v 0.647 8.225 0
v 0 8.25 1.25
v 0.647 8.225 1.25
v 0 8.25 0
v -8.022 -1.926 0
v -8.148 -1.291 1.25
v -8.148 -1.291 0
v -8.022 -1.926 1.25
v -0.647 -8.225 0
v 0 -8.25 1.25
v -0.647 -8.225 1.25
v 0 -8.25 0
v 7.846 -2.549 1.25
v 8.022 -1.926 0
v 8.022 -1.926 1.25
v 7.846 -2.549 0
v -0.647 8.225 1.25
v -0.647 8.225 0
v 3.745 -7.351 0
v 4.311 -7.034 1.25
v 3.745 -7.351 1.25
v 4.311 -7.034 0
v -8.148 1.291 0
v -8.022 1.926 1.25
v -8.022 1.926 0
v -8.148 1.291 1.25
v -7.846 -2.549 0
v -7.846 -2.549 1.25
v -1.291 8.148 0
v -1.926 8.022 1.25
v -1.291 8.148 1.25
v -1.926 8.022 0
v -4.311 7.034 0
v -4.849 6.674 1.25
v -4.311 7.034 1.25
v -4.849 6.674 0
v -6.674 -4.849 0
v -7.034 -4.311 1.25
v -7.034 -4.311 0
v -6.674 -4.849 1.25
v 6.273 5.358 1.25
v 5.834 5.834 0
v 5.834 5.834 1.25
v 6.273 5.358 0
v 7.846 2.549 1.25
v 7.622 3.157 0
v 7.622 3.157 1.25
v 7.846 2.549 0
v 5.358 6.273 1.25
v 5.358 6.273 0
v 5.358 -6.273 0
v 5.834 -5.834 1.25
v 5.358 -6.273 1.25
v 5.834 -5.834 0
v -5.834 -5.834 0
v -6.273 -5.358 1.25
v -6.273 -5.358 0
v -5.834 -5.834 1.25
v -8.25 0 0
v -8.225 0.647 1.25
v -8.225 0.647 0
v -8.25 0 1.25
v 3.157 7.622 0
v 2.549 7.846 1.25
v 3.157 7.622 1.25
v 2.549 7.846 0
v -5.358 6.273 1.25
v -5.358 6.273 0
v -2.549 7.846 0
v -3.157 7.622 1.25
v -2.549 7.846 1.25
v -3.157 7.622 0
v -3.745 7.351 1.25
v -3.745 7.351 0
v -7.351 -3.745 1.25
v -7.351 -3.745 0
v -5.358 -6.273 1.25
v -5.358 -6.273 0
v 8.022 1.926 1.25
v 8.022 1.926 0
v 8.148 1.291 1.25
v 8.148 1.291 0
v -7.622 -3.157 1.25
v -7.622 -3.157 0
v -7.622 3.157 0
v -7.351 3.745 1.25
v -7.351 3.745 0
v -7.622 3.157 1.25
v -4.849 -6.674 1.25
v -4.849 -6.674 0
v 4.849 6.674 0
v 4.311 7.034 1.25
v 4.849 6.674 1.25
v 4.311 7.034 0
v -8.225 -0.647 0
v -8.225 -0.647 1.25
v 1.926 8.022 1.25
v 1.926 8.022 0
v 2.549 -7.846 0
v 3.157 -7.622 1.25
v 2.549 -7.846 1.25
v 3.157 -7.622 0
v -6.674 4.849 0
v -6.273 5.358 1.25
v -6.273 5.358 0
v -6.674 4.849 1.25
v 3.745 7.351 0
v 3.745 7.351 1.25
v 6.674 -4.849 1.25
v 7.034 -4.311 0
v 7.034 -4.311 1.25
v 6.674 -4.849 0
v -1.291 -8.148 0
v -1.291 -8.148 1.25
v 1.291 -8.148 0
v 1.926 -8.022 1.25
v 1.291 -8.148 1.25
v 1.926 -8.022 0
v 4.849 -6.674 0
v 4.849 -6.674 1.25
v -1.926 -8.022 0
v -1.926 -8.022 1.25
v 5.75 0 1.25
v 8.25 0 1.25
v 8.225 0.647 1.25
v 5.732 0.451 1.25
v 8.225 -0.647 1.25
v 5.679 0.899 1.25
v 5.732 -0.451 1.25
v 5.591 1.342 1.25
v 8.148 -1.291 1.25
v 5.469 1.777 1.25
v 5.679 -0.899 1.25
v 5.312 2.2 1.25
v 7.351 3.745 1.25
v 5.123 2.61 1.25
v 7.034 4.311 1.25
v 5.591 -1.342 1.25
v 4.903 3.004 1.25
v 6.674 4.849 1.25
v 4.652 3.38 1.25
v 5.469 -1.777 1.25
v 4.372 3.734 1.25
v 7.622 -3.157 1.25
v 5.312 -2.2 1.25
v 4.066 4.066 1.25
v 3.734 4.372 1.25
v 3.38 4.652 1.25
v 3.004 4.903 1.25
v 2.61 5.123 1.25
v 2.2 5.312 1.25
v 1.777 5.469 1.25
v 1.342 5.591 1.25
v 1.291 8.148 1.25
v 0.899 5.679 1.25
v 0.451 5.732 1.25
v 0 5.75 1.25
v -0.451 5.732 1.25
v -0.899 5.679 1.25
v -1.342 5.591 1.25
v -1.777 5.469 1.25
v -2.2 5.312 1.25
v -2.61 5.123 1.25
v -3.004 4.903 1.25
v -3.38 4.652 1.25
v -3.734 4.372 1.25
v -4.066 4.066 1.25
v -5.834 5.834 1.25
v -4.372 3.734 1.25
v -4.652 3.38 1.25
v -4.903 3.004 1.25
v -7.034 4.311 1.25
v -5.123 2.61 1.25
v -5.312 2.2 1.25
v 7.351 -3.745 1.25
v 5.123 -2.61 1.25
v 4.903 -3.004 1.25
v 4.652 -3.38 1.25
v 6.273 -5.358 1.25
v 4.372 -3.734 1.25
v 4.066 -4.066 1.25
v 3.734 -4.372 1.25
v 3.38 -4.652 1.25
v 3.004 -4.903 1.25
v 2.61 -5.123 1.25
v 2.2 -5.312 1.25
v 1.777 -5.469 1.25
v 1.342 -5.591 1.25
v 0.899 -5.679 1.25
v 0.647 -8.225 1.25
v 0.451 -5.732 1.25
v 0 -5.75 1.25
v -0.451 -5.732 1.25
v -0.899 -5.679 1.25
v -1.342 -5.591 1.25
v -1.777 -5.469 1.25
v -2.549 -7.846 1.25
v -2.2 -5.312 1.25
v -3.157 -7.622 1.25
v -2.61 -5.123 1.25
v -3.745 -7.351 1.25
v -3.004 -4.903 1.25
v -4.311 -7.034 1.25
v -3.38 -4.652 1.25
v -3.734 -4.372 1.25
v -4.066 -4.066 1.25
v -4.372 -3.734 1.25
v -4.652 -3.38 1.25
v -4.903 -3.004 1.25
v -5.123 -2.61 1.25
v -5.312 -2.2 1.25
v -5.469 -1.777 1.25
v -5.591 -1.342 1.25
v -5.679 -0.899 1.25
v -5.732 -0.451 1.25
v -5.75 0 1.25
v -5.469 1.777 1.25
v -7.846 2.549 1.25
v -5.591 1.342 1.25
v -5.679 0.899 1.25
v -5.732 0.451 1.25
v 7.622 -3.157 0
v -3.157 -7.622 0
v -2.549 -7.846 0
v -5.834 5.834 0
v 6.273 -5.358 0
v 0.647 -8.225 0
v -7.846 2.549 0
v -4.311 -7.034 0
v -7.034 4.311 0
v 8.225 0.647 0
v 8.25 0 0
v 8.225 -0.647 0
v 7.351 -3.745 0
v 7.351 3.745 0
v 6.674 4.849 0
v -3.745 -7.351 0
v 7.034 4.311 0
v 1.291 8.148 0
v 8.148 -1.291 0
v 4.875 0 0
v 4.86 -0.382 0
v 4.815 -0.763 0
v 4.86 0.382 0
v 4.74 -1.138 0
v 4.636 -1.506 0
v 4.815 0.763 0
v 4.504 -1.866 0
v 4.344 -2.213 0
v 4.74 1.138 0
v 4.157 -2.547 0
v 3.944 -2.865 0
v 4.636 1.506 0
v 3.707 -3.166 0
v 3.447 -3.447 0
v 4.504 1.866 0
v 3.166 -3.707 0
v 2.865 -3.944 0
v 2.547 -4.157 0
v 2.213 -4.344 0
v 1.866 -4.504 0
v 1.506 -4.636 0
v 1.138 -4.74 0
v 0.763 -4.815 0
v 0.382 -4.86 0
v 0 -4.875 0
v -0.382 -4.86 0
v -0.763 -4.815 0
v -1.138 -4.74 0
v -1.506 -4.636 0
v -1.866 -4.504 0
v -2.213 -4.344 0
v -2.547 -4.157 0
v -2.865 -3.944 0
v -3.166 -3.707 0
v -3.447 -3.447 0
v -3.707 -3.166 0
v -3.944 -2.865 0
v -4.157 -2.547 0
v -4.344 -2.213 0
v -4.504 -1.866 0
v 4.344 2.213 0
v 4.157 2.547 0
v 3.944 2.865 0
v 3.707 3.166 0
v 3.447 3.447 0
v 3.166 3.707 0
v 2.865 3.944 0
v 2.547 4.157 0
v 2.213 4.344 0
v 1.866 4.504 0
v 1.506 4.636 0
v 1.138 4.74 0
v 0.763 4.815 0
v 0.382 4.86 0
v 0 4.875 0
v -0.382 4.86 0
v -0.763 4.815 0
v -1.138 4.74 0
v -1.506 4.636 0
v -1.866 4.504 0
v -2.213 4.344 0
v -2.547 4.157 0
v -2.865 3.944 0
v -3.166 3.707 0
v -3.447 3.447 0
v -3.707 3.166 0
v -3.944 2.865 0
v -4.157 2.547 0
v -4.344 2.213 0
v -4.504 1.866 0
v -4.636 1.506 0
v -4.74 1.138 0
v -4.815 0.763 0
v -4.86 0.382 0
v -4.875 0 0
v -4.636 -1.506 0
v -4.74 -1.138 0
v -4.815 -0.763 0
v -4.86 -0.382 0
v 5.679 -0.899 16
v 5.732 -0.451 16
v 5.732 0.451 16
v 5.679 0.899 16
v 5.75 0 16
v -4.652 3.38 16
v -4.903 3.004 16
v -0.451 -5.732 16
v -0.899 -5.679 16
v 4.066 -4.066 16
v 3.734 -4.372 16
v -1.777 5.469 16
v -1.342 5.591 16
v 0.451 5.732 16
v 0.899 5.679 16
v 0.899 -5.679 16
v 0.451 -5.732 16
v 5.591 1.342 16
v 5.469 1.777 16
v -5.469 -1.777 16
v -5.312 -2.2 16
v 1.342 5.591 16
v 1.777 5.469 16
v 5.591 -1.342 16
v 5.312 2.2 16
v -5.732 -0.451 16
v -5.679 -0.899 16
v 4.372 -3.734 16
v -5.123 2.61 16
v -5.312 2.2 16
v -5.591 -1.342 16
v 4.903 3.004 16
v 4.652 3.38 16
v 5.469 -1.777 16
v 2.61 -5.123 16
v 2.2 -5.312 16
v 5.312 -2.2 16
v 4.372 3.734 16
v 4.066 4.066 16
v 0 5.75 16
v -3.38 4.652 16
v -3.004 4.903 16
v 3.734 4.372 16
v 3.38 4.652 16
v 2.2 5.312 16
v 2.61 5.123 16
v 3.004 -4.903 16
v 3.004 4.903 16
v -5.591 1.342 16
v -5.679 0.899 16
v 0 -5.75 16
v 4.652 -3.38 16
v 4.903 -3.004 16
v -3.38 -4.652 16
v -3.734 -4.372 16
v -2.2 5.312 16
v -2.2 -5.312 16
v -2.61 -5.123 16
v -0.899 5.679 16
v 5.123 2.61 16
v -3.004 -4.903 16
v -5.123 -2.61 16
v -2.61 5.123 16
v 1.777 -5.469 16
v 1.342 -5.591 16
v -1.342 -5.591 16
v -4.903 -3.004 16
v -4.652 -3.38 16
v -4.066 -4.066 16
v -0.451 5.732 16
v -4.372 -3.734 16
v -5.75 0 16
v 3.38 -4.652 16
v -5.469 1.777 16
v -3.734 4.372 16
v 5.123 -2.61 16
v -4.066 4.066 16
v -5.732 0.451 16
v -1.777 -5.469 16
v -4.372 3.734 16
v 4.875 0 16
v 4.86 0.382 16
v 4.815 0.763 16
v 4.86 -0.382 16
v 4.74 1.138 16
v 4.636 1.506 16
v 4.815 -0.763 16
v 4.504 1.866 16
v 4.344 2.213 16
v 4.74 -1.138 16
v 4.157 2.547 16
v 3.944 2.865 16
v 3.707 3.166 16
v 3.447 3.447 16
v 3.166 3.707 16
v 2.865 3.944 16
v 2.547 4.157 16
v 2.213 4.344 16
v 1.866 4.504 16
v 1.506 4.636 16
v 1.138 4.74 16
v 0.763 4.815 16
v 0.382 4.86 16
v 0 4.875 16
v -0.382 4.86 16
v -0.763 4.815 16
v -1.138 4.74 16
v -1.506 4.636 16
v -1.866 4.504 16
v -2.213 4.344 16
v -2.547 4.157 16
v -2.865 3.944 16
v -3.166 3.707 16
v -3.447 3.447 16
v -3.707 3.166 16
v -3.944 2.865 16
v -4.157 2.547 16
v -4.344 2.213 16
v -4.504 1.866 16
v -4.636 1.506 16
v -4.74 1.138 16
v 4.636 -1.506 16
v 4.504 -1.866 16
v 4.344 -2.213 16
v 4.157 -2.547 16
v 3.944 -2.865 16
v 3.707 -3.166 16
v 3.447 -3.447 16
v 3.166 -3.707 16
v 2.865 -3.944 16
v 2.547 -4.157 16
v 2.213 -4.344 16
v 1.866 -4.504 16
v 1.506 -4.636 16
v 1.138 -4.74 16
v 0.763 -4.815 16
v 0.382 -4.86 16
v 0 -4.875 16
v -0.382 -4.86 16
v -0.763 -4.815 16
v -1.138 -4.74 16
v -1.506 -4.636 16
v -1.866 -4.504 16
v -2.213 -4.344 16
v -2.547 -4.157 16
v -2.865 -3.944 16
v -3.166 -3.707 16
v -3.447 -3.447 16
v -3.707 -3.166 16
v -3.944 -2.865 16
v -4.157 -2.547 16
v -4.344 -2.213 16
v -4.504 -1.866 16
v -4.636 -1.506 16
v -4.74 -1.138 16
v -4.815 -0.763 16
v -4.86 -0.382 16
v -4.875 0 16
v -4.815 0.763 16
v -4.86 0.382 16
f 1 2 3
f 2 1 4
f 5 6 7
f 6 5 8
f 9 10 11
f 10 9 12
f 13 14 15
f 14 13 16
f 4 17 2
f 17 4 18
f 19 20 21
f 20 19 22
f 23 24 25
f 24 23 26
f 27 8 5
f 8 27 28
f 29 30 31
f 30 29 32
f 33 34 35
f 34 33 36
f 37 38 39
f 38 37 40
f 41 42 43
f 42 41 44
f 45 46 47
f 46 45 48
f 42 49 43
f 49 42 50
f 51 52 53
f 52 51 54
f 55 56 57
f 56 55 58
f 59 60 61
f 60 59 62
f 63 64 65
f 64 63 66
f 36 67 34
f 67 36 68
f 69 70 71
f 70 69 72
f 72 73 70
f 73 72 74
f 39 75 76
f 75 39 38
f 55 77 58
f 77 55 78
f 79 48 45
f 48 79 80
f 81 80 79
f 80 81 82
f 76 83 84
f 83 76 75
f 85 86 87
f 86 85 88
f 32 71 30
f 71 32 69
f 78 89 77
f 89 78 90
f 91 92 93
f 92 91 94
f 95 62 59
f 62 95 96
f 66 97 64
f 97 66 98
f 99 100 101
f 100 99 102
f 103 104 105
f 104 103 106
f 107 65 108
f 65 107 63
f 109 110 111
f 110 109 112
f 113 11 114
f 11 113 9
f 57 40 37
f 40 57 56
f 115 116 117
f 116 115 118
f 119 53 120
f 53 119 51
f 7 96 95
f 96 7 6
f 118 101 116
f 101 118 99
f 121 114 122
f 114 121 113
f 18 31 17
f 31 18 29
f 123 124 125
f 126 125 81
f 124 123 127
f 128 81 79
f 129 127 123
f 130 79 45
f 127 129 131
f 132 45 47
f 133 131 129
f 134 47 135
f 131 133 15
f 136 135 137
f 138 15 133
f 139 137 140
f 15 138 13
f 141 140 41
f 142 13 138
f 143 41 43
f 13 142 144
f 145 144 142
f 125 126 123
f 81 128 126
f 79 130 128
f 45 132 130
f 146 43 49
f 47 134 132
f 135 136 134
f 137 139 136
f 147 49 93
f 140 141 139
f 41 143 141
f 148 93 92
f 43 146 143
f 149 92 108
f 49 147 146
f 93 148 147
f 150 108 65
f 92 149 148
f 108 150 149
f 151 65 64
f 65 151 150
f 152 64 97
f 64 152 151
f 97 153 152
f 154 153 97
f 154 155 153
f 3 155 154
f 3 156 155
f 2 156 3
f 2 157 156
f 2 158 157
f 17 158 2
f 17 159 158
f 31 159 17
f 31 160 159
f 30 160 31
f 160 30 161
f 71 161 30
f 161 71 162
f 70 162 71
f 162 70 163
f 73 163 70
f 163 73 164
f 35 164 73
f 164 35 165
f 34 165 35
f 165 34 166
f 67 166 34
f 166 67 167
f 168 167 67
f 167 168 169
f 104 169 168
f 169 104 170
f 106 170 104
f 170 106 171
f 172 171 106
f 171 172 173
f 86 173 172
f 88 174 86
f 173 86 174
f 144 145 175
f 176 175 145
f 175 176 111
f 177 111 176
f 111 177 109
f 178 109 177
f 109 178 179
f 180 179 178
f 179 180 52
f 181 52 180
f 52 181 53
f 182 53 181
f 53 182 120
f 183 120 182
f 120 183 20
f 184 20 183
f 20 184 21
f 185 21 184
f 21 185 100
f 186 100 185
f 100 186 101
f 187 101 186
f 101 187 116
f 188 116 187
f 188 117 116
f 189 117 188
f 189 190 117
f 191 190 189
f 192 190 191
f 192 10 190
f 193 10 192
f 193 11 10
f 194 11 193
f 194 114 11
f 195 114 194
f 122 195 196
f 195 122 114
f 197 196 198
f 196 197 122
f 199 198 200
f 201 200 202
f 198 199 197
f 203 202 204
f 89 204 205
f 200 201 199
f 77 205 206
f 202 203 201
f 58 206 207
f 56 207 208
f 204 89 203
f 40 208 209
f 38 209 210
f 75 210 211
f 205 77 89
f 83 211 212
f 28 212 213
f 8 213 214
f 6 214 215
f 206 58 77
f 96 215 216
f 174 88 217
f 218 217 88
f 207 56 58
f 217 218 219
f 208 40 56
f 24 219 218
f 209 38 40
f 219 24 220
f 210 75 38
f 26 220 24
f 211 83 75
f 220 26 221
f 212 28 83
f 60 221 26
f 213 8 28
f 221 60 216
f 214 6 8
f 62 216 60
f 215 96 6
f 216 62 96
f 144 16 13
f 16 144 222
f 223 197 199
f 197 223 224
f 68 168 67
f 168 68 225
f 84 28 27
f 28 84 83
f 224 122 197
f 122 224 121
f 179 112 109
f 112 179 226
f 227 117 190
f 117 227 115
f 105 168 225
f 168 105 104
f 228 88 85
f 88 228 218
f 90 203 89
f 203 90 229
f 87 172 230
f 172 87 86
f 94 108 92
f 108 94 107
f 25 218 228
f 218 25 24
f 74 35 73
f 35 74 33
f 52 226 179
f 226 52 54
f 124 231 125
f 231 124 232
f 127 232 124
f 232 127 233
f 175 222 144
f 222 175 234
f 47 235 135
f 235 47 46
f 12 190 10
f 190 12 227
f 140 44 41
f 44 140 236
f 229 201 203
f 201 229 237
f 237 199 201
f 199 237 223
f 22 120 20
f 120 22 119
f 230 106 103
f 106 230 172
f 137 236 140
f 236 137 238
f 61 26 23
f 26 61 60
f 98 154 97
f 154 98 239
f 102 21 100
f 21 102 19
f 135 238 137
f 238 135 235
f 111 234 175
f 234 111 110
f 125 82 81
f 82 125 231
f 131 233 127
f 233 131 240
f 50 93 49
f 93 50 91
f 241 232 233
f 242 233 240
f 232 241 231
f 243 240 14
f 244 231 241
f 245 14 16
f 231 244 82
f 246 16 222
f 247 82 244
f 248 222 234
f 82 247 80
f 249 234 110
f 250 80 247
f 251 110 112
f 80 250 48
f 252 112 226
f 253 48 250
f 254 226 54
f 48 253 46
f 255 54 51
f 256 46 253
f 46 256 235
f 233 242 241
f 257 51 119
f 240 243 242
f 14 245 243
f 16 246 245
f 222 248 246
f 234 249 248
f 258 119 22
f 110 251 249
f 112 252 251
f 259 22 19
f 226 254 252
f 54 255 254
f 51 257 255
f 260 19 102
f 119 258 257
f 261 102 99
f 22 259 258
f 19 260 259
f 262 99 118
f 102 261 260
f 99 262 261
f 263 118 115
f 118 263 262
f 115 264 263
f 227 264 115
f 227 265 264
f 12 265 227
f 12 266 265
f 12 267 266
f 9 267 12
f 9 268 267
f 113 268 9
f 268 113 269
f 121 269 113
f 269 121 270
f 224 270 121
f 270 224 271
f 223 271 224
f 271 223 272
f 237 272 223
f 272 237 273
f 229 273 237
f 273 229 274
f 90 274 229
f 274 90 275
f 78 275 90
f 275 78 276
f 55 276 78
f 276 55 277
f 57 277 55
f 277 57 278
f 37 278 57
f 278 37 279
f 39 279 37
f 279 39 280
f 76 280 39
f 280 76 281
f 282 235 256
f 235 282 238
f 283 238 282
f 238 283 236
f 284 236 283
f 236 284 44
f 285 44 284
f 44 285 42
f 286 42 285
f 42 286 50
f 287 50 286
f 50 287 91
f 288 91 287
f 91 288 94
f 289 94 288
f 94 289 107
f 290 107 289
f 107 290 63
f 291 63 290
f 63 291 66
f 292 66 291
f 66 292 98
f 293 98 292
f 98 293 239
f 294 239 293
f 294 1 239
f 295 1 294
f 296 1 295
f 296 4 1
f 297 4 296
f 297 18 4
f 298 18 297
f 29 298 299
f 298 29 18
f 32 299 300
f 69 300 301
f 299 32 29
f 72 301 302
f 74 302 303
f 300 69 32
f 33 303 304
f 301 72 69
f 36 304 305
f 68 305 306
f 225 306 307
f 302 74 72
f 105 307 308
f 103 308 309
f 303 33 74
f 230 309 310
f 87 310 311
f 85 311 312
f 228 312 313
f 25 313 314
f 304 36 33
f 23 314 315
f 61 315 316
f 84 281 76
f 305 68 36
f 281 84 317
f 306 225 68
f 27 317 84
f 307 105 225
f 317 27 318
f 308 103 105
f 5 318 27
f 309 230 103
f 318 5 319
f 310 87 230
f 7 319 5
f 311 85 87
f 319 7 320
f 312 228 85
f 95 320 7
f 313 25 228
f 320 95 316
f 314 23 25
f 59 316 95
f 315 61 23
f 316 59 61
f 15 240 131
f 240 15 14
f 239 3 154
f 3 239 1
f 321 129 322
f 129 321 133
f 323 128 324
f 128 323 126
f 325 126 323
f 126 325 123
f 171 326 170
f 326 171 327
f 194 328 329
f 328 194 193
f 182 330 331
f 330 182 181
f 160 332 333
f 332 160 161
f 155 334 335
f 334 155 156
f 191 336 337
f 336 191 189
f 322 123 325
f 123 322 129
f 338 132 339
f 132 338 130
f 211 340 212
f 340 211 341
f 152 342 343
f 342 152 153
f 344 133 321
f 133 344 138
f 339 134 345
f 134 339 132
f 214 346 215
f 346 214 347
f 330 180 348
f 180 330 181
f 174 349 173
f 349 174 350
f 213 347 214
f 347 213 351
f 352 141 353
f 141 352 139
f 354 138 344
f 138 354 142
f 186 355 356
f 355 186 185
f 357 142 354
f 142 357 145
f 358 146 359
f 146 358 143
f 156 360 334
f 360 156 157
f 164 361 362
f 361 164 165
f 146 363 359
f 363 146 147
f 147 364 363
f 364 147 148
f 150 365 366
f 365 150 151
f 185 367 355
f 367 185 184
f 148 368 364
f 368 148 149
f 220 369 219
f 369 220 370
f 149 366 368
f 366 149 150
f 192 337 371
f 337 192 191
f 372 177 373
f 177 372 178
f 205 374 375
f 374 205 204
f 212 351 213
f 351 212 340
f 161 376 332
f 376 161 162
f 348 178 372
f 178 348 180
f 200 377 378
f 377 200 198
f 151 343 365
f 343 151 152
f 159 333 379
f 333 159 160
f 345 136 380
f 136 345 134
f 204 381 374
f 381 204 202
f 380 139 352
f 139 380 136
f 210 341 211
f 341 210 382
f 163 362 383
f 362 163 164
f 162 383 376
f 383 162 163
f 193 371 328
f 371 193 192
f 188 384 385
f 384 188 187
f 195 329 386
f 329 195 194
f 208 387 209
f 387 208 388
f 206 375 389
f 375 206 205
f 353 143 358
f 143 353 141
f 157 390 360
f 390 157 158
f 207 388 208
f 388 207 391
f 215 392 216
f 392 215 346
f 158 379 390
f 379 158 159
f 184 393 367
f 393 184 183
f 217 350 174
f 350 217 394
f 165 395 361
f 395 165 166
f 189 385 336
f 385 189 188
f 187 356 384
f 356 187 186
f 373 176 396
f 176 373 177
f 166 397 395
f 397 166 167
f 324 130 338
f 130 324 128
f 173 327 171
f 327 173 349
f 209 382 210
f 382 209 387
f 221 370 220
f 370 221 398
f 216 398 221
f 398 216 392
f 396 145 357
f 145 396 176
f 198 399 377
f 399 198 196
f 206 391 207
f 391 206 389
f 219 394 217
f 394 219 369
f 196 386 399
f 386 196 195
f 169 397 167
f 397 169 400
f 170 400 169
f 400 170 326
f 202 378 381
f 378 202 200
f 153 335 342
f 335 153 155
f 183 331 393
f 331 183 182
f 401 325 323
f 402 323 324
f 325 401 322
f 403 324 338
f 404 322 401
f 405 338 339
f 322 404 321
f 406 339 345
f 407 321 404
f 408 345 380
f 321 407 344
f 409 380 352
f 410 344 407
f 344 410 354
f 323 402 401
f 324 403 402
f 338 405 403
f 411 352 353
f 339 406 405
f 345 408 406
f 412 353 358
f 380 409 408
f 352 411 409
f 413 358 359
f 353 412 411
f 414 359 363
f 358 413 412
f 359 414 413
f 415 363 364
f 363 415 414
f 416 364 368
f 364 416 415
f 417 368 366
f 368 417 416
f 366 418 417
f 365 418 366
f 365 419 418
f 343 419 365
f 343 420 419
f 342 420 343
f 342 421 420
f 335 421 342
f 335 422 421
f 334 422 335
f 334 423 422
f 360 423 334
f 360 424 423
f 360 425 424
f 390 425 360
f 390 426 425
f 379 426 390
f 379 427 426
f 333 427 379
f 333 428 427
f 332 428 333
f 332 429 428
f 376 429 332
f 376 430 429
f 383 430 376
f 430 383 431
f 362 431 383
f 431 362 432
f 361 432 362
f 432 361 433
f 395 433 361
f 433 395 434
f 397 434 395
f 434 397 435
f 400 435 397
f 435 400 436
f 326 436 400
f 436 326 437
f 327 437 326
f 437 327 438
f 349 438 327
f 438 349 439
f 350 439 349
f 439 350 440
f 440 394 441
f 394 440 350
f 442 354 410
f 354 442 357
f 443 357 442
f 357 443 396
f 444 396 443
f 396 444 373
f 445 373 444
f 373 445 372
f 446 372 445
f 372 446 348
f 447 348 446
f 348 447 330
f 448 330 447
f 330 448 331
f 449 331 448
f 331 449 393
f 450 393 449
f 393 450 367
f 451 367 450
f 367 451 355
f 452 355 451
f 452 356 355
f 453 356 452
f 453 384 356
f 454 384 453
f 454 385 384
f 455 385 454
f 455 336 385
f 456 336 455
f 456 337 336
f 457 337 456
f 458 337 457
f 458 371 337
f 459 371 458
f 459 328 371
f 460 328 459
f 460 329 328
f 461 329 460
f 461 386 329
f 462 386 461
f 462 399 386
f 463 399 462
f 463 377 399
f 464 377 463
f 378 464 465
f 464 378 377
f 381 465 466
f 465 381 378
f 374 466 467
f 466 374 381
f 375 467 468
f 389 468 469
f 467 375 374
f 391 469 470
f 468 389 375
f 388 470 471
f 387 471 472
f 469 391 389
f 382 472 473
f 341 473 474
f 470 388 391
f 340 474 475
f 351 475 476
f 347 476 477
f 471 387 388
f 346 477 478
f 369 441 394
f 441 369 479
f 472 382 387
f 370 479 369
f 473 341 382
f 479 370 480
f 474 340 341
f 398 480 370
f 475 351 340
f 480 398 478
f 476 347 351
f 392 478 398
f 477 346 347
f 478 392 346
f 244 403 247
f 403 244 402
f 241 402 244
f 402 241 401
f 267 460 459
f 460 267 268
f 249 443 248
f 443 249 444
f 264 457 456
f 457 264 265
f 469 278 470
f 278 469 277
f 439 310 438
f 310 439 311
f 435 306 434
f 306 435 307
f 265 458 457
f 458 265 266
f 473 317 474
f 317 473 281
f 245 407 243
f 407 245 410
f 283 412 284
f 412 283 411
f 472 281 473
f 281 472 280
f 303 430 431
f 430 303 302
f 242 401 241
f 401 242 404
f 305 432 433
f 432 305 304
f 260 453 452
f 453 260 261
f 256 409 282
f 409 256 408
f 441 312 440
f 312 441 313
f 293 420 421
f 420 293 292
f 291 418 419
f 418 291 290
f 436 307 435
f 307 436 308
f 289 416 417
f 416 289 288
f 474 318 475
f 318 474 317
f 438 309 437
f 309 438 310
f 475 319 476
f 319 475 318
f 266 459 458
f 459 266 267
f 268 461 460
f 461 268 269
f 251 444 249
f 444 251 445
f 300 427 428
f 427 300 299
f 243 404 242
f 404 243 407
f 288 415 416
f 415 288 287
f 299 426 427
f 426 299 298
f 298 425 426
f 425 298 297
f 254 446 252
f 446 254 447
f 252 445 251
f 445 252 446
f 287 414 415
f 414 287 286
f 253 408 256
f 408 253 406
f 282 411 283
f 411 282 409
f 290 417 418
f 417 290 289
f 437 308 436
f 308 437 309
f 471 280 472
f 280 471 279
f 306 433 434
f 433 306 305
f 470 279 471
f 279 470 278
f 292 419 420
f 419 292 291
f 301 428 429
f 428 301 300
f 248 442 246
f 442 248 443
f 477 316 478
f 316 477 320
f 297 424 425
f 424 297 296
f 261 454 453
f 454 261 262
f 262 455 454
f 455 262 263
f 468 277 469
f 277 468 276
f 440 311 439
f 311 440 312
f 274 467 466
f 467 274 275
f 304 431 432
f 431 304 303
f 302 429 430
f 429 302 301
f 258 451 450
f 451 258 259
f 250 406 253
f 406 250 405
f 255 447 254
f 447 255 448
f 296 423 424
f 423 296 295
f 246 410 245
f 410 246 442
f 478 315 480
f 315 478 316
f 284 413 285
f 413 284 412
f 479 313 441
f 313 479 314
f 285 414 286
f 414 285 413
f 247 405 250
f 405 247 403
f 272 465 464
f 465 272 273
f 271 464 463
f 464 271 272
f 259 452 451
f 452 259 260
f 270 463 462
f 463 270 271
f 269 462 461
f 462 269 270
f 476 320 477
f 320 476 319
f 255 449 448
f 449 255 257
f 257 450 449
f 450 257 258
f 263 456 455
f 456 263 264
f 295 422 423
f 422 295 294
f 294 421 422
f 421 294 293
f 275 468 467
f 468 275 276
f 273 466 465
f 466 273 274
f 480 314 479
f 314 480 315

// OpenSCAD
// file: common.scad
// Measurements and routines common across adapters.

band_full_thickness = 1.25;    // thickest point of the band
band_full_diameter = 16.5;  // diameter at widest point of band

// profile = [
//     [0,0],
//     [band_edge_diameter / 2, 0],
//     [band_full_diameter / 2, (band_full_thickness - band_edge_thickness) / 2],
//     [band_full_diameter / 2, band_full_thickness - ((band_full_thickness - band_edge_thickness) / 2)],
//     [band_edge_diameter / 2, band_full_thickness],
//     [0,band_full_thickness],
// ];

profile = [
    [0,0],
    [band_full_diameter / 2, 0],
    [band_full_diameter / 2, band_full_thickness],
    [0,band_full_thickness],
];

module band() {
    rotate_extrude($fn=80) polygon(points=profile);
}
// main file
// Plotter pen adapter for a Copic brush pen
//
// Modified by Sasha Kovar <sasha-thing@arcocene.org>
// from a design by Brian Boucheron <brian@boucheron.org>

include <common.scad>;

body_outer_diameter = 11.5; // outer diameter of the main body
body_inner_diameter = 9.75; // inner diameter of the main body

difference() {
    union() {
        band();
        cylinder(r=body_outer_diameter/2, h=16, $fn=80);
    }
    translate([0,0,-25]) cylinder(r=body_inner_diameter/2, h=50, $fn=80);
}
